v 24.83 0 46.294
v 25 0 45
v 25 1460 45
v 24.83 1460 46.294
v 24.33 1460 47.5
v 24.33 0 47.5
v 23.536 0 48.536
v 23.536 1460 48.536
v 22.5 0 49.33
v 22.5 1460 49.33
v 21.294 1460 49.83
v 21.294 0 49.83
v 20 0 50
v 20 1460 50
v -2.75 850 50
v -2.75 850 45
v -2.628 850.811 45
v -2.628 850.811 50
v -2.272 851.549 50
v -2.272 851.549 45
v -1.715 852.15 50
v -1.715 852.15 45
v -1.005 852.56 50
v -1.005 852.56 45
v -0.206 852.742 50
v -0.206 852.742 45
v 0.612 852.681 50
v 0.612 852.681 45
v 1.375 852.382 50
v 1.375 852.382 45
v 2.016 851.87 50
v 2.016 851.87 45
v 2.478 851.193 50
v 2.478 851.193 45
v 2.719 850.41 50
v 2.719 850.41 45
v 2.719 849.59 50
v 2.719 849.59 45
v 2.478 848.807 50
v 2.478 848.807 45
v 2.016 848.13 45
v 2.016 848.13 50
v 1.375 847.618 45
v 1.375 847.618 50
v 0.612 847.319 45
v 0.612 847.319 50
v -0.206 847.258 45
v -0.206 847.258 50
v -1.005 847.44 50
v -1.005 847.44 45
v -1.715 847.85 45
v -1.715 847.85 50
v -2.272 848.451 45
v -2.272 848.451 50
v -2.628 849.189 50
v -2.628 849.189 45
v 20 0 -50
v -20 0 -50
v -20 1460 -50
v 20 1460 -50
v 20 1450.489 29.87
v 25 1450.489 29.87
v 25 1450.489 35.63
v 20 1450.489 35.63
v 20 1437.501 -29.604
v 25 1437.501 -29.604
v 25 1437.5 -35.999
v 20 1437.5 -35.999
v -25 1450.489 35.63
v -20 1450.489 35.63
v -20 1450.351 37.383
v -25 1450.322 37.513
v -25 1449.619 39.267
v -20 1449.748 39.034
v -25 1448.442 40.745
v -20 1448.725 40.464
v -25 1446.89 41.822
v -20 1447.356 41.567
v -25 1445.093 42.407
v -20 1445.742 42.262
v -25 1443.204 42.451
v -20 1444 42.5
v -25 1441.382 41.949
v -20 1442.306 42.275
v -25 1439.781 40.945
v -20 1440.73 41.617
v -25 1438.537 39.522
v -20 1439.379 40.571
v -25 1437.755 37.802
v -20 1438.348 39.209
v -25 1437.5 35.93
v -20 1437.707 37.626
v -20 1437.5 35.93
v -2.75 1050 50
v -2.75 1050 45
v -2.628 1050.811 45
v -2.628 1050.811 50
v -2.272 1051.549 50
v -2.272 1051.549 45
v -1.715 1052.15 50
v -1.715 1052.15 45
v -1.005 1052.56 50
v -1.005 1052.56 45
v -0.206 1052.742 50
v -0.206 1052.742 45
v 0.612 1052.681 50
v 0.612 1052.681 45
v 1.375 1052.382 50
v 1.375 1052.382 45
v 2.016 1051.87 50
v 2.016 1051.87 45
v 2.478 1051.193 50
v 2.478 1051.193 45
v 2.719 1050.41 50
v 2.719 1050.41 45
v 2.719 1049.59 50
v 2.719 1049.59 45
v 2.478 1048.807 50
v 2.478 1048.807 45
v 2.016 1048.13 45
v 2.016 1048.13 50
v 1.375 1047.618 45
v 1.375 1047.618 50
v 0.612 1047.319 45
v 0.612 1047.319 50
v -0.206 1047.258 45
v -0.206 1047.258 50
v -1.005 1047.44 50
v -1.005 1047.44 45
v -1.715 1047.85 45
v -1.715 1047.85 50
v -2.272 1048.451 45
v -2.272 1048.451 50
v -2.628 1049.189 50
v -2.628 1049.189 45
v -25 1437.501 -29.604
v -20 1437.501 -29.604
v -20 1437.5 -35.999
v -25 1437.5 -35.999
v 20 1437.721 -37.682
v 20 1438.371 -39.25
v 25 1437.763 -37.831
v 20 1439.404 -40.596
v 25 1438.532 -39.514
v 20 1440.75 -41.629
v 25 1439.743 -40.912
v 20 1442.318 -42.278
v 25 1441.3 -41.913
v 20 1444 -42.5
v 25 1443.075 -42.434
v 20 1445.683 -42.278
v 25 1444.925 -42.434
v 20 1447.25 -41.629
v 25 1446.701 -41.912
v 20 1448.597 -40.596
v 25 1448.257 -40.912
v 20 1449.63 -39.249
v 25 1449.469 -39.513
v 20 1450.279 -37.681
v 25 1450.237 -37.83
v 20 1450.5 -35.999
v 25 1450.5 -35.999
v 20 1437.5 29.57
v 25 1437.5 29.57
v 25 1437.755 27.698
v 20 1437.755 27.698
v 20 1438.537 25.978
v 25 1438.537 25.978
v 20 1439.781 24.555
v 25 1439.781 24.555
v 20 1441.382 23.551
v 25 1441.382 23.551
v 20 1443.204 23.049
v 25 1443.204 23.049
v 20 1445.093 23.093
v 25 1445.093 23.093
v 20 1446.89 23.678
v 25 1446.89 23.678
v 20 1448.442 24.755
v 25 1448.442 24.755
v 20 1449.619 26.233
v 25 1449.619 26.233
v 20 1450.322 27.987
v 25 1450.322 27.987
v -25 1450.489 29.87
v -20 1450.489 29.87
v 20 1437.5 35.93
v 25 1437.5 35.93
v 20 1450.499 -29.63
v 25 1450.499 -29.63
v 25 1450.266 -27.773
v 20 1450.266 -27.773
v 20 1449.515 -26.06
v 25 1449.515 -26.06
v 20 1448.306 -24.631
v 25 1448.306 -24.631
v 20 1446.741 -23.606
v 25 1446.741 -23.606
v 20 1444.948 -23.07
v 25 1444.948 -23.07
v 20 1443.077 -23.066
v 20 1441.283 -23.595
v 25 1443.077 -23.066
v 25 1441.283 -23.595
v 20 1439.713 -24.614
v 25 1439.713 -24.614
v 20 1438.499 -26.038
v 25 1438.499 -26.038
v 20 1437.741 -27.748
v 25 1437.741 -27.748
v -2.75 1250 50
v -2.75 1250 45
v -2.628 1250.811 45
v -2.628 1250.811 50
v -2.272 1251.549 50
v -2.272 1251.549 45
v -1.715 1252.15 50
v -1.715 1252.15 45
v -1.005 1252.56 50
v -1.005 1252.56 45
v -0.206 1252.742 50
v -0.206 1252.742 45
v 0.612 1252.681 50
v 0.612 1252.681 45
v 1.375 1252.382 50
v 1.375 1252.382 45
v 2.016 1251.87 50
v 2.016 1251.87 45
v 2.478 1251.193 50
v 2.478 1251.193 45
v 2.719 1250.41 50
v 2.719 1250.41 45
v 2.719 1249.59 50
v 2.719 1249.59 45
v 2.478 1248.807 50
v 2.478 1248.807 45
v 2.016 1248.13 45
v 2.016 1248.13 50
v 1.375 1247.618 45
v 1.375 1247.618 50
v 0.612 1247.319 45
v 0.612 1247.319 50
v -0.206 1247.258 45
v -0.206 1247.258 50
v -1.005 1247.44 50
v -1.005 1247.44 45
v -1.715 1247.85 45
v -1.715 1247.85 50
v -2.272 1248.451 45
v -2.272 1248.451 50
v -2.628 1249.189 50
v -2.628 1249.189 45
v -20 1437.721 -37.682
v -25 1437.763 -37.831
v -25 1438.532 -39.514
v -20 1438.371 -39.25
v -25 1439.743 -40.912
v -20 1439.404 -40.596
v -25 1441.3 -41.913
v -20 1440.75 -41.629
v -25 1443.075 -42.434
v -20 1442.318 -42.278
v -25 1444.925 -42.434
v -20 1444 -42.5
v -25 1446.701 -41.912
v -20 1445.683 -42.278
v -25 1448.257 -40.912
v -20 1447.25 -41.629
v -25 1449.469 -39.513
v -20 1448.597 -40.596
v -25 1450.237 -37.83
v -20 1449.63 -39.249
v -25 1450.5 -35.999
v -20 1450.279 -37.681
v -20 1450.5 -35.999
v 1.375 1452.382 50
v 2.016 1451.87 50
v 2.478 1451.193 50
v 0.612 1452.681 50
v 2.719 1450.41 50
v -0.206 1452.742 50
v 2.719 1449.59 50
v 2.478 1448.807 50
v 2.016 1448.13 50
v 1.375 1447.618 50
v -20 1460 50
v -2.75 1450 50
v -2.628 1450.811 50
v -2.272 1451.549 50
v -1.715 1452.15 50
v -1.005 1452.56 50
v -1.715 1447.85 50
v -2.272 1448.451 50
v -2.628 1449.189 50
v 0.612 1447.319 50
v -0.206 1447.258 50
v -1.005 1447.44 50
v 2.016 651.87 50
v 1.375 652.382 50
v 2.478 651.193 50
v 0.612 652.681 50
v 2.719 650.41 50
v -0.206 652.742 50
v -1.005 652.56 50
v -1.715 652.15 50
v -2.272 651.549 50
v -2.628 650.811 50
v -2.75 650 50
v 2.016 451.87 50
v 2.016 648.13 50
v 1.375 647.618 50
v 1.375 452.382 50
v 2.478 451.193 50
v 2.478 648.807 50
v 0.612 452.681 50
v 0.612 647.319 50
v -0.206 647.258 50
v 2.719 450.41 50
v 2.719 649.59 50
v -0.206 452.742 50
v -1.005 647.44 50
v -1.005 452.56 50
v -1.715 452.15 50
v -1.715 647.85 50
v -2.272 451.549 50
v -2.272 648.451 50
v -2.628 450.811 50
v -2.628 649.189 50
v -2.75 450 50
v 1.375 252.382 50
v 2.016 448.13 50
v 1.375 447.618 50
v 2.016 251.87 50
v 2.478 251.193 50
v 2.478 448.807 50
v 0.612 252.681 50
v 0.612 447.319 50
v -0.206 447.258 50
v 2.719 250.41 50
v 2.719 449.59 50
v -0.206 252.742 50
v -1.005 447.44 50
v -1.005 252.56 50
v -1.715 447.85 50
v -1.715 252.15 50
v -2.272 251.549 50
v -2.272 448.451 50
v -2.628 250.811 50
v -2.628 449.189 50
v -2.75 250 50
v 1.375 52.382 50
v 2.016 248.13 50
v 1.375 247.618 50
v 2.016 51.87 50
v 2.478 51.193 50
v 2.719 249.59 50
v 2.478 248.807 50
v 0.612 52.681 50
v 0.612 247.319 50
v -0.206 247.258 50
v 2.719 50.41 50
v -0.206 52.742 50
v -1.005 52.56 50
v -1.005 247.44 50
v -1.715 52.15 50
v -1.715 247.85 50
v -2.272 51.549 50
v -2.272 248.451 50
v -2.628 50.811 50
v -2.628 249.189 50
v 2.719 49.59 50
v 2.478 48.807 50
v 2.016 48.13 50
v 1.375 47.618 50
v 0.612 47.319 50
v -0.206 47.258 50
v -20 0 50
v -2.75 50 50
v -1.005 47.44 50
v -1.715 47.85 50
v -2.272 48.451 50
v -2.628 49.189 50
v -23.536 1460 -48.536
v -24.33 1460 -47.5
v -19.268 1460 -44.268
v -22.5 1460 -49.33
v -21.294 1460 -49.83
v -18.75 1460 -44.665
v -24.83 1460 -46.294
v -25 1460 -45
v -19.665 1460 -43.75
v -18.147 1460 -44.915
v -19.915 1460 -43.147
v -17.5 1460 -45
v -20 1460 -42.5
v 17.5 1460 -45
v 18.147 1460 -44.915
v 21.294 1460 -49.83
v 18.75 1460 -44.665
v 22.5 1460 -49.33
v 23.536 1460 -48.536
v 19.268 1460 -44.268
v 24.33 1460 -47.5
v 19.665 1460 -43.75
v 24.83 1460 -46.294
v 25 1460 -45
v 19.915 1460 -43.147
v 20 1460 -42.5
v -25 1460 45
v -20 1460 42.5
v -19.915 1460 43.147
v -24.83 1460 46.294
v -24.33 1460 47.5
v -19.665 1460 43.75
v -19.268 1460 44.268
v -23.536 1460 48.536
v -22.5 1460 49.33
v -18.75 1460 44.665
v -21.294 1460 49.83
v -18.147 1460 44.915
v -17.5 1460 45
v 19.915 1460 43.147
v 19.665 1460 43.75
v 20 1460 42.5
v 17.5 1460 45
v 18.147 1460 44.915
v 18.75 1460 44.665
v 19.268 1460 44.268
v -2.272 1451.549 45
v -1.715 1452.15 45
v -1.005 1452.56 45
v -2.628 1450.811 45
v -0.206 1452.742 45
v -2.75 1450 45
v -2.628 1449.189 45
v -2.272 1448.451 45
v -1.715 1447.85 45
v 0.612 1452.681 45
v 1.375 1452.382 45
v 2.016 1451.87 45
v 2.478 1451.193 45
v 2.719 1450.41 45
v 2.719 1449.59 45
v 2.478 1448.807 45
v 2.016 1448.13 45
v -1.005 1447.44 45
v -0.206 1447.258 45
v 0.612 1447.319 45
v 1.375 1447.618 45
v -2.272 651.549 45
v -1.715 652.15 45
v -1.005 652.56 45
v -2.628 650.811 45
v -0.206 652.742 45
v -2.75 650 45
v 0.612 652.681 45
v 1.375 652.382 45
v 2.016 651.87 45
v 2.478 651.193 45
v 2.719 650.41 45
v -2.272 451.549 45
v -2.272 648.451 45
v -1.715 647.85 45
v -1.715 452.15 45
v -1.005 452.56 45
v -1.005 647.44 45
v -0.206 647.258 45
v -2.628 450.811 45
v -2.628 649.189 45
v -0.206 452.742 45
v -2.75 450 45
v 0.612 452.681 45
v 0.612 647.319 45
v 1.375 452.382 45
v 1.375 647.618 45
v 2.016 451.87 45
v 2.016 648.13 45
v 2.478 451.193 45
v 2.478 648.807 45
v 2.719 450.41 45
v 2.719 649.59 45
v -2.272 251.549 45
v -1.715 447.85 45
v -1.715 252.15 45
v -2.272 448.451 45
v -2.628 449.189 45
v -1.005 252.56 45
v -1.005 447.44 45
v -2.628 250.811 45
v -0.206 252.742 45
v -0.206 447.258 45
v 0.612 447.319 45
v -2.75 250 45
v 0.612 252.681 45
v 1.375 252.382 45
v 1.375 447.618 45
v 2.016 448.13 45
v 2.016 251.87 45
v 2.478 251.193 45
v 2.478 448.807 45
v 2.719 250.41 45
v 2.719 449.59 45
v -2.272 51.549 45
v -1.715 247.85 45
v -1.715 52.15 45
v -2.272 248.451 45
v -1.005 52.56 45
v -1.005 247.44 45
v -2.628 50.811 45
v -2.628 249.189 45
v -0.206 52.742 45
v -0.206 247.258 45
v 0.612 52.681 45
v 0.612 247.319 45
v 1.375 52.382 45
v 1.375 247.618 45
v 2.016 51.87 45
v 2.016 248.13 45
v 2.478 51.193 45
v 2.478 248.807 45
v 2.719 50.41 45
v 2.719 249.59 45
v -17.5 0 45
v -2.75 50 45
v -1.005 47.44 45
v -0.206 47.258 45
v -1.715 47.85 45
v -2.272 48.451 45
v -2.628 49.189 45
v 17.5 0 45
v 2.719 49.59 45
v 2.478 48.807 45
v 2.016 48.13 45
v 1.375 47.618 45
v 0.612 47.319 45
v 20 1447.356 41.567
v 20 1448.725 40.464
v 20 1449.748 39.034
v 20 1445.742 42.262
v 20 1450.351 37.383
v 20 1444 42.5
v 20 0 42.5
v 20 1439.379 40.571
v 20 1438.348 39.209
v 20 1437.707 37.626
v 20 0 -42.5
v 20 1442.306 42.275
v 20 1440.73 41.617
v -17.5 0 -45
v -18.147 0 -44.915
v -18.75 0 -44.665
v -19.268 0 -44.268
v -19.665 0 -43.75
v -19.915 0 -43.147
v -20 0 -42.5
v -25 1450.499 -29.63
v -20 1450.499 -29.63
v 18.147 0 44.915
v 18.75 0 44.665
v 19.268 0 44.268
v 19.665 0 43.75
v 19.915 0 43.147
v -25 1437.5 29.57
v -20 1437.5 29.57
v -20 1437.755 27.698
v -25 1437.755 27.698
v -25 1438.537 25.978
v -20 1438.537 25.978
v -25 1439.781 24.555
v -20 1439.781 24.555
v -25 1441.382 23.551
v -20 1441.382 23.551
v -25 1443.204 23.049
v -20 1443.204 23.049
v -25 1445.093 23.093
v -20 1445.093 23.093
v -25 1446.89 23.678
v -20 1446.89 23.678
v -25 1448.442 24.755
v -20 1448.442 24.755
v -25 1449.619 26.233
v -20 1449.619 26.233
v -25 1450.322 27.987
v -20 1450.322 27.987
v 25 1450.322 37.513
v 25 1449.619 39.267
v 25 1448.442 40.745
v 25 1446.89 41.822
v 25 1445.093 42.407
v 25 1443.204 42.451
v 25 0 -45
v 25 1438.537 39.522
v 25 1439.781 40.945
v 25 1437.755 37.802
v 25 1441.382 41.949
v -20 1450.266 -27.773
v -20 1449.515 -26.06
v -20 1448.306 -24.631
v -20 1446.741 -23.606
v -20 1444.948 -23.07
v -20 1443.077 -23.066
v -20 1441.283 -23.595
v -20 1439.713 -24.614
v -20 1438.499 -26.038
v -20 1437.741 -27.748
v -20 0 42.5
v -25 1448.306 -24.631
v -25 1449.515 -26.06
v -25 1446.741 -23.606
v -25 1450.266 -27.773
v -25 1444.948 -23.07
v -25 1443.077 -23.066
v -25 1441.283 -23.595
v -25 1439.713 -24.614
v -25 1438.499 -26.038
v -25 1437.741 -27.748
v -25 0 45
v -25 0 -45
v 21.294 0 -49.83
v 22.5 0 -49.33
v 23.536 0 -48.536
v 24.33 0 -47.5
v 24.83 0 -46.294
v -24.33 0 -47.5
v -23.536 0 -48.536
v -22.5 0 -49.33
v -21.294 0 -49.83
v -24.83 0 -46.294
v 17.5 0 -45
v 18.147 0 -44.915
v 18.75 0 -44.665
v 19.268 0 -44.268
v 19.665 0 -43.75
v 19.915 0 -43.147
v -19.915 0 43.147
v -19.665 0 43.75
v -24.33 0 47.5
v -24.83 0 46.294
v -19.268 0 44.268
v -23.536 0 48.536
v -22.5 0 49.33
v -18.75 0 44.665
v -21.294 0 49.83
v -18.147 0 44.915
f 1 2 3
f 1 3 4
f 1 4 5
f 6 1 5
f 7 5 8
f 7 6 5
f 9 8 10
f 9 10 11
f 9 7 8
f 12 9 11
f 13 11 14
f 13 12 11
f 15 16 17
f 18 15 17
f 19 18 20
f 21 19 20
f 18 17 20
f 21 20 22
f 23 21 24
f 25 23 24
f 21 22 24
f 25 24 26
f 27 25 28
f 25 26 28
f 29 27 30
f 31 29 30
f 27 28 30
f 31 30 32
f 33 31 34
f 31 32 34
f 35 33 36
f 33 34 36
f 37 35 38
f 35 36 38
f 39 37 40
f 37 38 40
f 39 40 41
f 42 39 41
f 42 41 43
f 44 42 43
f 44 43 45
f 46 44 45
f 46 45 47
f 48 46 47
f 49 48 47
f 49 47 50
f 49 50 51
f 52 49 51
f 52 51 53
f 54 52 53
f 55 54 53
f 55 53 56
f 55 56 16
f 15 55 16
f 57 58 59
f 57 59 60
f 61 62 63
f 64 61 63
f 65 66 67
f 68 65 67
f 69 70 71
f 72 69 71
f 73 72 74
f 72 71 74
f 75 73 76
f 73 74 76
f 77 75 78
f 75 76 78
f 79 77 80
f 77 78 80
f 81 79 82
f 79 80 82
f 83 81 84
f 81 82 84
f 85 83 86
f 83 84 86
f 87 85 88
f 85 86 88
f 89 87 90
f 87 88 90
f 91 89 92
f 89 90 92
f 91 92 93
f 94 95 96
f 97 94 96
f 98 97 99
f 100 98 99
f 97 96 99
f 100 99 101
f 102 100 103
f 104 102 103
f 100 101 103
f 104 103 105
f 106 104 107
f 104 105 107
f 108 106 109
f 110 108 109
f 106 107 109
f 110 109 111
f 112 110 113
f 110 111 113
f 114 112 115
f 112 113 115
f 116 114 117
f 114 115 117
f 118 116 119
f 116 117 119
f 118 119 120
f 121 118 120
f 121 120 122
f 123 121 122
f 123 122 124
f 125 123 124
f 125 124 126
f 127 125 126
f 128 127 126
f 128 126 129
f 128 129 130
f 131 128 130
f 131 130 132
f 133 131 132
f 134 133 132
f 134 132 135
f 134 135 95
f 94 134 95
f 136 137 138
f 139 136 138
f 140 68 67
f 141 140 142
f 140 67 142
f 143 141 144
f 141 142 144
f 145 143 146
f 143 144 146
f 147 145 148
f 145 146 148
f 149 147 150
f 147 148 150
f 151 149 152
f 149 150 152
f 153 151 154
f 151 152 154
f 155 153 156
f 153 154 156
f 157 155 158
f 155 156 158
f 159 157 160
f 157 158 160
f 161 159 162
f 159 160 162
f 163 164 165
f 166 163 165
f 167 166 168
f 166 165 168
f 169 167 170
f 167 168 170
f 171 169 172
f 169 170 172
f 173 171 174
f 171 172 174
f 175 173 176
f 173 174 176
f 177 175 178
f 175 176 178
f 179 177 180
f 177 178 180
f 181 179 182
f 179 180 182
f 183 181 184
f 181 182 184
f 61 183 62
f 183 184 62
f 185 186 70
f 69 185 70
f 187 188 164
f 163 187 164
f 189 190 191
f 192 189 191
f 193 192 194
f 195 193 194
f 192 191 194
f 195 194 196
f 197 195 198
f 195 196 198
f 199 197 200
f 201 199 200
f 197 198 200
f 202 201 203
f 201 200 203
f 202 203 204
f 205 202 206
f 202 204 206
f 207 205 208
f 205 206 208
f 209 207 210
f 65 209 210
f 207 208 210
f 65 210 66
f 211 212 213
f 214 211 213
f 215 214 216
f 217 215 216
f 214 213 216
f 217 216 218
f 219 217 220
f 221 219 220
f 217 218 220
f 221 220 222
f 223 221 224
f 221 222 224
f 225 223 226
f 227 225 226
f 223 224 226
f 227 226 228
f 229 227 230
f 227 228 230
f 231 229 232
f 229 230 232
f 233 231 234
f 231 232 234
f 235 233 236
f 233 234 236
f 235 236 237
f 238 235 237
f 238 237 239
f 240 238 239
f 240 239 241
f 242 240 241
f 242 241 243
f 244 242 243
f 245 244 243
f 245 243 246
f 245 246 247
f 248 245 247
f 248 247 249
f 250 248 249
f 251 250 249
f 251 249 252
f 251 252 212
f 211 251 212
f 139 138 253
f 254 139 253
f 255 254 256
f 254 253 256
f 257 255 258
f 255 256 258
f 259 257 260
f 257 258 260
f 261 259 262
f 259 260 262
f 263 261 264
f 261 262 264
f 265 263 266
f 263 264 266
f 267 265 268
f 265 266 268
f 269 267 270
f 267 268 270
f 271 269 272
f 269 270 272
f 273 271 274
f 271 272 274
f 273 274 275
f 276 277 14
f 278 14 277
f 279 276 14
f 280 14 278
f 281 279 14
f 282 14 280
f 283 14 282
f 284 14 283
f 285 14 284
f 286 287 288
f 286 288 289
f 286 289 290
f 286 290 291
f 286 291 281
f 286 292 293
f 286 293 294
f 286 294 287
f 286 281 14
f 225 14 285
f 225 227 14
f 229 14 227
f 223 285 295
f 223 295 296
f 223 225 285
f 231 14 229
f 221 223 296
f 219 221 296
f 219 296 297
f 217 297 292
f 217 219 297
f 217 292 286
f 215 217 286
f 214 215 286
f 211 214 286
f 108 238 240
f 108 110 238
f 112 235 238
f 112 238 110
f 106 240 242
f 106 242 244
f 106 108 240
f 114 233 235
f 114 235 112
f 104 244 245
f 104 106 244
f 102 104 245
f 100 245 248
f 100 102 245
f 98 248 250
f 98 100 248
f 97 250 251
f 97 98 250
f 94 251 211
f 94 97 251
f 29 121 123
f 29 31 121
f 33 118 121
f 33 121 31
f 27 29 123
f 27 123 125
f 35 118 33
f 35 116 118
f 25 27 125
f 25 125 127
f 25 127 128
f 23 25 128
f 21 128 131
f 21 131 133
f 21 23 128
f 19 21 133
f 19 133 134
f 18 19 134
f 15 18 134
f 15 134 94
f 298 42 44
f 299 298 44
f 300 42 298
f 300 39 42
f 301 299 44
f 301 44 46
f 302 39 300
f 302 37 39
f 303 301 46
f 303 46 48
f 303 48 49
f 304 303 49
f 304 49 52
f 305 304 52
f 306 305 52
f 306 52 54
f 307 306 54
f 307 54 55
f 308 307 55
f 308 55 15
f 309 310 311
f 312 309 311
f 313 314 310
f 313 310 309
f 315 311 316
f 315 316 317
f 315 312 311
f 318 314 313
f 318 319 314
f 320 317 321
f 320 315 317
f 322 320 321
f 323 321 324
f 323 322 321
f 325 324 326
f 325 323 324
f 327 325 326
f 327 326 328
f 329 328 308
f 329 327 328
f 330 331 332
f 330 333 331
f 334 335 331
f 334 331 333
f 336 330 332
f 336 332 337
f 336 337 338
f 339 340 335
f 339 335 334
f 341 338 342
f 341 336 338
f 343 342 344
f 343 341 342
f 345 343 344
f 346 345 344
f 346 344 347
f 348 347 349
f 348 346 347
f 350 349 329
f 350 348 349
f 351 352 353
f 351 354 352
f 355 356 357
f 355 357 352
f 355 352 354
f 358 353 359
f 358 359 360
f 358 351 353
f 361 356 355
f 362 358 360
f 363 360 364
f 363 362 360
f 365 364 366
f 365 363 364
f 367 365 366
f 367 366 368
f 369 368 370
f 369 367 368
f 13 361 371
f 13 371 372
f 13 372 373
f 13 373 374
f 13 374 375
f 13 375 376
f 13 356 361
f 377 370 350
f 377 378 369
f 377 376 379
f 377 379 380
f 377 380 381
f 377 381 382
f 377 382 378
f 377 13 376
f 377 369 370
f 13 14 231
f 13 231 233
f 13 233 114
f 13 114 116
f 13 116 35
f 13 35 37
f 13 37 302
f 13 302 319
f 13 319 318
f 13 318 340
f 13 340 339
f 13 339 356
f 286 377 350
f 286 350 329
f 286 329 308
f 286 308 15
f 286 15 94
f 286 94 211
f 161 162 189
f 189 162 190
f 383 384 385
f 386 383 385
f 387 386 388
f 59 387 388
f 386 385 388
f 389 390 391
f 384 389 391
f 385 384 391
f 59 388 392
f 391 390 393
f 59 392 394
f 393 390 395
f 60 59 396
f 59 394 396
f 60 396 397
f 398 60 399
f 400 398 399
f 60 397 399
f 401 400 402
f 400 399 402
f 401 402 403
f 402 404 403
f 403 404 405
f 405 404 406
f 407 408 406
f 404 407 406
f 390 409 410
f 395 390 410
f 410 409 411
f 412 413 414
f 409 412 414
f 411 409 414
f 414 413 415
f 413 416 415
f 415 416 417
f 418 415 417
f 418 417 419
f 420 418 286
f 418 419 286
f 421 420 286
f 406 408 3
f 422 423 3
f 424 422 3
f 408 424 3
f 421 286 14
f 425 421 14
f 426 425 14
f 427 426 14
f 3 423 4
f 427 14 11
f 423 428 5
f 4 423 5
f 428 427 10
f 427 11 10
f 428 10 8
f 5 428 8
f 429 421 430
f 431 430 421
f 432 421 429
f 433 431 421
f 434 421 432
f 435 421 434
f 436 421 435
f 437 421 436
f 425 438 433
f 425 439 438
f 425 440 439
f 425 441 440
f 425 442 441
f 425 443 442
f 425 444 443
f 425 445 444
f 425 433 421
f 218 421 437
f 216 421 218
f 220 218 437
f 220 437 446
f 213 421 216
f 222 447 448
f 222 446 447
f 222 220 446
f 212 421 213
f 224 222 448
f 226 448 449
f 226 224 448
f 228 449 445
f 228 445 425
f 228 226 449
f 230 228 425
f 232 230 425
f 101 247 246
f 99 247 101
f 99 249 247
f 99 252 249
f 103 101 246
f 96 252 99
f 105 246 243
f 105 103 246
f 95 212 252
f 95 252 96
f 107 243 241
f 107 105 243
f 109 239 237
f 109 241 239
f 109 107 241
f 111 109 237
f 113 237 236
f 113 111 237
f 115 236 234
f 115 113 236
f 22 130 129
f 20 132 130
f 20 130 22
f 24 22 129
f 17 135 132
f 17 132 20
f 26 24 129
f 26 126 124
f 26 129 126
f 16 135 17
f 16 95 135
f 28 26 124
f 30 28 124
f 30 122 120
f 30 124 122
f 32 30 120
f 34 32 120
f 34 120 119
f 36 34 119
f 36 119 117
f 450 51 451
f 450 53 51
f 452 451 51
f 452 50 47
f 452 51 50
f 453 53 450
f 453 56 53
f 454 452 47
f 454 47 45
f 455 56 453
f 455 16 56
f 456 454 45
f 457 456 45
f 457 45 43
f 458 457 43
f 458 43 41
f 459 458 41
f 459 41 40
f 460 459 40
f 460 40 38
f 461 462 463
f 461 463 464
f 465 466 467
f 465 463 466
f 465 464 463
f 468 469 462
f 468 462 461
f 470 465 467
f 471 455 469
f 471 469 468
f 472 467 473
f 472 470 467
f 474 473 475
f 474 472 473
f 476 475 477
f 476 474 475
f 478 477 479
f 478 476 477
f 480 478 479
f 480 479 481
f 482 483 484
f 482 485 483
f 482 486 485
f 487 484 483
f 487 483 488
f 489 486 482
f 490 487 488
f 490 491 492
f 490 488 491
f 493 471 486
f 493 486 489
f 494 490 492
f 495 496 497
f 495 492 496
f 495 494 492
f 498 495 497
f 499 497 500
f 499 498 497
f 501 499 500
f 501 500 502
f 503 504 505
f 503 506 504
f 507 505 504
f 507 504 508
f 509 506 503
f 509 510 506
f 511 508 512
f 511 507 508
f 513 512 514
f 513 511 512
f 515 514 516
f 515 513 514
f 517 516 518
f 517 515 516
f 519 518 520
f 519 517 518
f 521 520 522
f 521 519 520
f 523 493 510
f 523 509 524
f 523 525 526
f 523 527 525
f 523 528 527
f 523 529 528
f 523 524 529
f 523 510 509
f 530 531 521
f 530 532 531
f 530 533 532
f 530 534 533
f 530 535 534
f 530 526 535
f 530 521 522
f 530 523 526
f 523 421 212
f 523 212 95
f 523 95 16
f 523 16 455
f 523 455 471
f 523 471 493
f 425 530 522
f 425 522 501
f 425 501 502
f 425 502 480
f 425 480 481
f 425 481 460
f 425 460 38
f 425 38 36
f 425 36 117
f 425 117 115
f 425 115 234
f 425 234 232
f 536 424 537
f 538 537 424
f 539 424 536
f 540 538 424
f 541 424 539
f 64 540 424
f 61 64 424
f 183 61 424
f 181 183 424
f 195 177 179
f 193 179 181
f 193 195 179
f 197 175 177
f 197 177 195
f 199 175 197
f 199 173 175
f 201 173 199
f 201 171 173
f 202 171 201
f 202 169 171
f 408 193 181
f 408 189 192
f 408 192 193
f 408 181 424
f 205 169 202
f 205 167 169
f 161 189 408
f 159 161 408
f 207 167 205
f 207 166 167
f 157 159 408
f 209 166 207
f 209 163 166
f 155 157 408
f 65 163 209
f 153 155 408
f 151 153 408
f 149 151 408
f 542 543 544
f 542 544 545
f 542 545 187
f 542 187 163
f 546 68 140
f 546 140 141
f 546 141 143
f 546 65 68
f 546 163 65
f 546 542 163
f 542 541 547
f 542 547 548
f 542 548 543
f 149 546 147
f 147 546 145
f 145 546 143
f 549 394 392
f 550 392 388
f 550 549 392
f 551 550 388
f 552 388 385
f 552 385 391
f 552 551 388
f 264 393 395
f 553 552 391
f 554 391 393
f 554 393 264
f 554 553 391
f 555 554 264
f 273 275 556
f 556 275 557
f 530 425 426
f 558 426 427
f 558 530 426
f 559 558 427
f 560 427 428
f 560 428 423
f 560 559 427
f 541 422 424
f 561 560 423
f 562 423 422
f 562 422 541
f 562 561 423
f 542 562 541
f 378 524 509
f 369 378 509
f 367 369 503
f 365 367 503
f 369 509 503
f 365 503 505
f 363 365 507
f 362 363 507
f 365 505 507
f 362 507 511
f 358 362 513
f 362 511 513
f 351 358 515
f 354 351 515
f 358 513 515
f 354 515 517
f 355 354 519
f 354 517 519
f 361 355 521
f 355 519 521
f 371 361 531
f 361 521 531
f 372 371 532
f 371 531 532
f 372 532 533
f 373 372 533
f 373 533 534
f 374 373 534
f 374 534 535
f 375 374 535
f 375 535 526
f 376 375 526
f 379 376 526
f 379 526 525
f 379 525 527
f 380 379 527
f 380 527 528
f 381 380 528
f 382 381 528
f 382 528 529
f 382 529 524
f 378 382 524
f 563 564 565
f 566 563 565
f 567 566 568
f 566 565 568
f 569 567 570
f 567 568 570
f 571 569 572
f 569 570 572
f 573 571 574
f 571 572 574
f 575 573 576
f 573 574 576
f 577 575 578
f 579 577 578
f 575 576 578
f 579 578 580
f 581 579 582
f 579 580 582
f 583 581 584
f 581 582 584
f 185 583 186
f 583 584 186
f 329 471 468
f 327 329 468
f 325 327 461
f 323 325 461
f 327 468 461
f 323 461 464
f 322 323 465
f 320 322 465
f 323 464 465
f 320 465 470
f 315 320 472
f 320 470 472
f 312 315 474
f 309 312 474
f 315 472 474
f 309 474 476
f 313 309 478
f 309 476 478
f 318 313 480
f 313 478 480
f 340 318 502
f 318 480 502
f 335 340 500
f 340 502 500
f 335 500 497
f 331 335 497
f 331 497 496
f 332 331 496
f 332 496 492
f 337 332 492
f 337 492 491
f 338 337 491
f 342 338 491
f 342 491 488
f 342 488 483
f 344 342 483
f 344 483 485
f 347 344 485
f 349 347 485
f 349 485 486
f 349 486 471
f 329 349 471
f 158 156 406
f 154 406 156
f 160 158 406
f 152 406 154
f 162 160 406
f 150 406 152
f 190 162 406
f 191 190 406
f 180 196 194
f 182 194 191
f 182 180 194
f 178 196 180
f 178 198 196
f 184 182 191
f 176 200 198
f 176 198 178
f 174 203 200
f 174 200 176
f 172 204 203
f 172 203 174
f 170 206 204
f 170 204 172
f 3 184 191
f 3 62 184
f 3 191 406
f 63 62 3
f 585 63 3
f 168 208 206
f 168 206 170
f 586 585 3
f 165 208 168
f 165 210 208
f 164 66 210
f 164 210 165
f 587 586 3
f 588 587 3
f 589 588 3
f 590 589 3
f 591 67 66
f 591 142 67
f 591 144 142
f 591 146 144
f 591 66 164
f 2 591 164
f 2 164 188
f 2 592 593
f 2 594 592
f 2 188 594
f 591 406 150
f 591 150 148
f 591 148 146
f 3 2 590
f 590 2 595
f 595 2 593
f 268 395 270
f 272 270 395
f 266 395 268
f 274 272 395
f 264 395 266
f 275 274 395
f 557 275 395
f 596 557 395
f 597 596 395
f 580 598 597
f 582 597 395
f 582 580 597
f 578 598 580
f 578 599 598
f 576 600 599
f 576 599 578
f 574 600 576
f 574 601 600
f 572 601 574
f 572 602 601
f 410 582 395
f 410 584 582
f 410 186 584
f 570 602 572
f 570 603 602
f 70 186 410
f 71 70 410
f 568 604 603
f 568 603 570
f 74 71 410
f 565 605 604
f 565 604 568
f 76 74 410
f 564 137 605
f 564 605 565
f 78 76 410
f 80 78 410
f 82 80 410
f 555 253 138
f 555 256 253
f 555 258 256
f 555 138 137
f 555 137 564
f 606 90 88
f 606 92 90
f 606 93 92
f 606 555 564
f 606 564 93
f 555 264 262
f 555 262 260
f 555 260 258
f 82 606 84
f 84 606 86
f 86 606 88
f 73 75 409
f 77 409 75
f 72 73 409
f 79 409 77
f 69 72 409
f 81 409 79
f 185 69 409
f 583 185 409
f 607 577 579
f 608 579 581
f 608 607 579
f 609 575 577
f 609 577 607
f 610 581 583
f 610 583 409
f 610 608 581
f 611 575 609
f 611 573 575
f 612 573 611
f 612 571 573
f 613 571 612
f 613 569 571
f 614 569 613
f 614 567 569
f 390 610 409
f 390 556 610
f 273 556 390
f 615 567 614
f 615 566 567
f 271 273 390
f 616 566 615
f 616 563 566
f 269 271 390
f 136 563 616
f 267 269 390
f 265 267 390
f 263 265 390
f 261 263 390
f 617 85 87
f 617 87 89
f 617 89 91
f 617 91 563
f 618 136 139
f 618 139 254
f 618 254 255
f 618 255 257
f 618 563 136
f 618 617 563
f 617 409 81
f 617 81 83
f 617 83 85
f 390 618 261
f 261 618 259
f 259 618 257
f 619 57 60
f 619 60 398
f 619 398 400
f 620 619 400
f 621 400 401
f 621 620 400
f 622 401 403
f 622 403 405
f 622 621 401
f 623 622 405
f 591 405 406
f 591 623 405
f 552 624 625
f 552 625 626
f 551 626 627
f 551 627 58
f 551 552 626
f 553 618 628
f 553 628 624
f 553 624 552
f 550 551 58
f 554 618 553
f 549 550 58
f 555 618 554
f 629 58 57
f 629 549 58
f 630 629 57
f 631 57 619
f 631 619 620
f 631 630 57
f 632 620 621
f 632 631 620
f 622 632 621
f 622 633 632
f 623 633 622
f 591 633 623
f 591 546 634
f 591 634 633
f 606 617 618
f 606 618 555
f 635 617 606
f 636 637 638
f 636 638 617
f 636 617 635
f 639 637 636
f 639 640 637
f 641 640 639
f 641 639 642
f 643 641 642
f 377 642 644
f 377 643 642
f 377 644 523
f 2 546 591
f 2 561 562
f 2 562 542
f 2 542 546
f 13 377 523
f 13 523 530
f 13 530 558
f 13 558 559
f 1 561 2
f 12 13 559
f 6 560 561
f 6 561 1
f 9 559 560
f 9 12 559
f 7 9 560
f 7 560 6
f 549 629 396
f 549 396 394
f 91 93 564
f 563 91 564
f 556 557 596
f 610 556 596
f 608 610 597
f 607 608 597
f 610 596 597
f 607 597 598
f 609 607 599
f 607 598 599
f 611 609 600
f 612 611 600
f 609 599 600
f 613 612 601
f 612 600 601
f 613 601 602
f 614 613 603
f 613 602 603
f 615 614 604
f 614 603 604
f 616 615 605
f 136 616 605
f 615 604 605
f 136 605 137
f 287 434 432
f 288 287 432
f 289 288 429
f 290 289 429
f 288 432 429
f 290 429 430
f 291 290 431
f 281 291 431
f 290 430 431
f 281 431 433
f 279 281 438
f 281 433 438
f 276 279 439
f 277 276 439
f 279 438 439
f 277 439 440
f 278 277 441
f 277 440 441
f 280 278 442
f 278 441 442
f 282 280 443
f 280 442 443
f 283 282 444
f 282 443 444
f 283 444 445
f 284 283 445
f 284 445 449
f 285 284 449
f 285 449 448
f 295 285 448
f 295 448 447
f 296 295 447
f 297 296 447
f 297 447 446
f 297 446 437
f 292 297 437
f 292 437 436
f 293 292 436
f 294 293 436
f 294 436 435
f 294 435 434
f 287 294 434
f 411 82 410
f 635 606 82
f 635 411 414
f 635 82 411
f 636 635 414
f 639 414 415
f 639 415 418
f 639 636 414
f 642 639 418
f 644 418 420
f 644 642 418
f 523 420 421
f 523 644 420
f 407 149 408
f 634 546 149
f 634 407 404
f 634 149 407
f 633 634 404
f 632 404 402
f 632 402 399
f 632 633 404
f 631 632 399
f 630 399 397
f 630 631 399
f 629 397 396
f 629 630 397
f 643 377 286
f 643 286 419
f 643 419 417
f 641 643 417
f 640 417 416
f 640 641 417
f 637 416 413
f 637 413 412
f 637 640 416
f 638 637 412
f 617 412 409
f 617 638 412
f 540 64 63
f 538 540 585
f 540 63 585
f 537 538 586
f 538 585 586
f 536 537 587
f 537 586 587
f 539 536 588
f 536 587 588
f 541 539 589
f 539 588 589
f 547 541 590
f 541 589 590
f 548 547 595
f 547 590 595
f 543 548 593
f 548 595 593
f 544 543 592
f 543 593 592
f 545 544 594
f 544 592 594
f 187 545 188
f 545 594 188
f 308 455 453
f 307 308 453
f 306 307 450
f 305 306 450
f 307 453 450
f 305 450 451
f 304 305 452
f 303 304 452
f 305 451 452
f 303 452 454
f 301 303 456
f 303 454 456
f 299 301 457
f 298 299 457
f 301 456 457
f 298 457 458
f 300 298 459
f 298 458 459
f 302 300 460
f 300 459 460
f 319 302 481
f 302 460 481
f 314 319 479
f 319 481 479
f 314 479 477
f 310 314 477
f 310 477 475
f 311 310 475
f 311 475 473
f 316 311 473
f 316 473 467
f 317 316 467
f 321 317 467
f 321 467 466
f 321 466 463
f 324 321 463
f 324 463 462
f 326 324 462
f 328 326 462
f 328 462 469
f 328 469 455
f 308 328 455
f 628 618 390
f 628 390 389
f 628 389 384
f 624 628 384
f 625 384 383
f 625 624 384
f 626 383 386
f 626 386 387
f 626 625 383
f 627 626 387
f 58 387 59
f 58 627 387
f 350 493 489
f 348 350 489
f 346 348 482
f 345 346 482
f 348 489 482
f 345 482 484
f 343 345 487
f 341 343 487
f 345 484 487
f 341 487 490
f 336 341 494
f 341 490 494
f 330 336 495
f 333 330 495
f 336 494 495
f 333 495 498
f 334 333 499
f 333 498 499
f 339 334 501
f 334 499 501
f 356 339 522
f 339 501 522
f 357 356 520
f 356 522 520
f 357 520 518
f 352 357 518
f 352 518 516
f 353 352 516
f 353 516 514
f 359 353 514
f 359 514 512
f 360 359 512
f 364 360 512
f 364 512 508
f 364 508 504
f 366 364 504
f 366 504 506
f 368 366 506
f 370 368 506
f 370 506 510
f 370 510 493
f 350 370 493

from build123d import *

# Parameters (mm, degrees)
F1_DEPTH = 1460
F3_D     = 5.5
F3_DEPTH = 14.4
F3_TIP   = 1.6523667023
F5_DEPTH = 50.001


# Not quite as in the source:
# - a feature names something its author has since deleted; it is built from what else it names


with BuildPart() as f1:
    # F0 (on Front) → F1 (new body)
    with BuildSketch(Plane.XZ):
        with BuildLine():
            Line((-20, -50), (20, -50))
            ThreePointArc((20, -50), (23.5355339059, -48.5355339059), (25, -45))
            Line((25, -45), (25, 45))
            ThreePointArc((25, 45), (23.5355339059, 48.5355339059), (20, 50))
            Line((20, 50), (-20, 50))
            ThreePointArc((-20, 50), (-23.5355339059, 48.5355339059), (-25, 45))
            Line((-25, 45), (-25, -45))
            ThreePointArc((-25, -45), (-23.5355339059, -48.5355339059), (-20, -50))
        make_face()
        with BuildLine():
            ThreePointArc((-17.5, -45), (-19.267766953, -44.267766953), (-20, -42.5))
            Line((-20, -42.5), (-20, 42.5))
            ThreePointArc((-20, 42.5), (-19.267766953, 44.267766953), (-17.5, 45))
            Line((-17.5, 45), (17.5, 45))
            ThreePointArc((17.5, 45), (19.267766953, 44.267766953), (20, 42.5))
            Line((20, 42.5), (20, -42.5))
            ThreePointArc((20, -42.5), (19.267766953, -44.267766953), (17.5, -45))
            Line((17.5, -45), (-17.5, -45))
        make_face(mode=Mode.SUBTRACT)
    extrude(amount=-F1_DEPTH)

    # F3
    with Locations(Plane.XY.offset(50)):
        with Locations((0, 50), (0, 250), (0, 450), (0, 650), (0, 850), (0, 1050), (0, 1250), (0, 1450)):
            Hole(F3_D / 2, depth=F3_DEPTH)
            with Locations((0, 0, -(F3_DEPTH + F3_TIP / 2))):  # 118° drill point
                Cone(0, F3_D / 2, F3_TIP, mode=Mode.SUBTRACT)

    # F4 (on face) → F5 (cut, through all)
    with BuildSketch(Plane.YZ.offset(25)):
        with BuildLine():
            Line((1450.4894832185, 29.8696045958), (1450.4894832185, 35.6303954042))
            ThreePointArc((1450.4894832185, 35.6303954042), (1444.1498086534, 42.4982734143), (1437.5003786468, 35.9298411402))
            Line((1437.5003786468, 35.9298411402), (1437.5003786468, 29.5701588598))
            ThreePointArc((1437.5003786468, 29.5701588598), (1444.1498086534, 23.0017265857), (1450.4894832185, 29.8696045958))
        make_face()
        with BuildLine():
            Line((1437.5008297564, -29.6038563662), (1437.5000000547, -35.999156715))
            ThreePointArc((1437.5000000547, -35.999156715), (1444.0002415297, -42.4999999955), (1450.4999998647, -35.9986736556))
            Line((1450.4999998647, -35.9986736556), (1450.4987003133, -29.6299778371))
            ThreePointArc((1450.4987003133, -29.6299778371), (1444.0130628488, -23.000013126), (1437.5008297564, -29.6038563662))
        make_face()
    extrude(amount=-F5_DEPTH, mode=Mode.SUBTRACT)


solid = f1.part
